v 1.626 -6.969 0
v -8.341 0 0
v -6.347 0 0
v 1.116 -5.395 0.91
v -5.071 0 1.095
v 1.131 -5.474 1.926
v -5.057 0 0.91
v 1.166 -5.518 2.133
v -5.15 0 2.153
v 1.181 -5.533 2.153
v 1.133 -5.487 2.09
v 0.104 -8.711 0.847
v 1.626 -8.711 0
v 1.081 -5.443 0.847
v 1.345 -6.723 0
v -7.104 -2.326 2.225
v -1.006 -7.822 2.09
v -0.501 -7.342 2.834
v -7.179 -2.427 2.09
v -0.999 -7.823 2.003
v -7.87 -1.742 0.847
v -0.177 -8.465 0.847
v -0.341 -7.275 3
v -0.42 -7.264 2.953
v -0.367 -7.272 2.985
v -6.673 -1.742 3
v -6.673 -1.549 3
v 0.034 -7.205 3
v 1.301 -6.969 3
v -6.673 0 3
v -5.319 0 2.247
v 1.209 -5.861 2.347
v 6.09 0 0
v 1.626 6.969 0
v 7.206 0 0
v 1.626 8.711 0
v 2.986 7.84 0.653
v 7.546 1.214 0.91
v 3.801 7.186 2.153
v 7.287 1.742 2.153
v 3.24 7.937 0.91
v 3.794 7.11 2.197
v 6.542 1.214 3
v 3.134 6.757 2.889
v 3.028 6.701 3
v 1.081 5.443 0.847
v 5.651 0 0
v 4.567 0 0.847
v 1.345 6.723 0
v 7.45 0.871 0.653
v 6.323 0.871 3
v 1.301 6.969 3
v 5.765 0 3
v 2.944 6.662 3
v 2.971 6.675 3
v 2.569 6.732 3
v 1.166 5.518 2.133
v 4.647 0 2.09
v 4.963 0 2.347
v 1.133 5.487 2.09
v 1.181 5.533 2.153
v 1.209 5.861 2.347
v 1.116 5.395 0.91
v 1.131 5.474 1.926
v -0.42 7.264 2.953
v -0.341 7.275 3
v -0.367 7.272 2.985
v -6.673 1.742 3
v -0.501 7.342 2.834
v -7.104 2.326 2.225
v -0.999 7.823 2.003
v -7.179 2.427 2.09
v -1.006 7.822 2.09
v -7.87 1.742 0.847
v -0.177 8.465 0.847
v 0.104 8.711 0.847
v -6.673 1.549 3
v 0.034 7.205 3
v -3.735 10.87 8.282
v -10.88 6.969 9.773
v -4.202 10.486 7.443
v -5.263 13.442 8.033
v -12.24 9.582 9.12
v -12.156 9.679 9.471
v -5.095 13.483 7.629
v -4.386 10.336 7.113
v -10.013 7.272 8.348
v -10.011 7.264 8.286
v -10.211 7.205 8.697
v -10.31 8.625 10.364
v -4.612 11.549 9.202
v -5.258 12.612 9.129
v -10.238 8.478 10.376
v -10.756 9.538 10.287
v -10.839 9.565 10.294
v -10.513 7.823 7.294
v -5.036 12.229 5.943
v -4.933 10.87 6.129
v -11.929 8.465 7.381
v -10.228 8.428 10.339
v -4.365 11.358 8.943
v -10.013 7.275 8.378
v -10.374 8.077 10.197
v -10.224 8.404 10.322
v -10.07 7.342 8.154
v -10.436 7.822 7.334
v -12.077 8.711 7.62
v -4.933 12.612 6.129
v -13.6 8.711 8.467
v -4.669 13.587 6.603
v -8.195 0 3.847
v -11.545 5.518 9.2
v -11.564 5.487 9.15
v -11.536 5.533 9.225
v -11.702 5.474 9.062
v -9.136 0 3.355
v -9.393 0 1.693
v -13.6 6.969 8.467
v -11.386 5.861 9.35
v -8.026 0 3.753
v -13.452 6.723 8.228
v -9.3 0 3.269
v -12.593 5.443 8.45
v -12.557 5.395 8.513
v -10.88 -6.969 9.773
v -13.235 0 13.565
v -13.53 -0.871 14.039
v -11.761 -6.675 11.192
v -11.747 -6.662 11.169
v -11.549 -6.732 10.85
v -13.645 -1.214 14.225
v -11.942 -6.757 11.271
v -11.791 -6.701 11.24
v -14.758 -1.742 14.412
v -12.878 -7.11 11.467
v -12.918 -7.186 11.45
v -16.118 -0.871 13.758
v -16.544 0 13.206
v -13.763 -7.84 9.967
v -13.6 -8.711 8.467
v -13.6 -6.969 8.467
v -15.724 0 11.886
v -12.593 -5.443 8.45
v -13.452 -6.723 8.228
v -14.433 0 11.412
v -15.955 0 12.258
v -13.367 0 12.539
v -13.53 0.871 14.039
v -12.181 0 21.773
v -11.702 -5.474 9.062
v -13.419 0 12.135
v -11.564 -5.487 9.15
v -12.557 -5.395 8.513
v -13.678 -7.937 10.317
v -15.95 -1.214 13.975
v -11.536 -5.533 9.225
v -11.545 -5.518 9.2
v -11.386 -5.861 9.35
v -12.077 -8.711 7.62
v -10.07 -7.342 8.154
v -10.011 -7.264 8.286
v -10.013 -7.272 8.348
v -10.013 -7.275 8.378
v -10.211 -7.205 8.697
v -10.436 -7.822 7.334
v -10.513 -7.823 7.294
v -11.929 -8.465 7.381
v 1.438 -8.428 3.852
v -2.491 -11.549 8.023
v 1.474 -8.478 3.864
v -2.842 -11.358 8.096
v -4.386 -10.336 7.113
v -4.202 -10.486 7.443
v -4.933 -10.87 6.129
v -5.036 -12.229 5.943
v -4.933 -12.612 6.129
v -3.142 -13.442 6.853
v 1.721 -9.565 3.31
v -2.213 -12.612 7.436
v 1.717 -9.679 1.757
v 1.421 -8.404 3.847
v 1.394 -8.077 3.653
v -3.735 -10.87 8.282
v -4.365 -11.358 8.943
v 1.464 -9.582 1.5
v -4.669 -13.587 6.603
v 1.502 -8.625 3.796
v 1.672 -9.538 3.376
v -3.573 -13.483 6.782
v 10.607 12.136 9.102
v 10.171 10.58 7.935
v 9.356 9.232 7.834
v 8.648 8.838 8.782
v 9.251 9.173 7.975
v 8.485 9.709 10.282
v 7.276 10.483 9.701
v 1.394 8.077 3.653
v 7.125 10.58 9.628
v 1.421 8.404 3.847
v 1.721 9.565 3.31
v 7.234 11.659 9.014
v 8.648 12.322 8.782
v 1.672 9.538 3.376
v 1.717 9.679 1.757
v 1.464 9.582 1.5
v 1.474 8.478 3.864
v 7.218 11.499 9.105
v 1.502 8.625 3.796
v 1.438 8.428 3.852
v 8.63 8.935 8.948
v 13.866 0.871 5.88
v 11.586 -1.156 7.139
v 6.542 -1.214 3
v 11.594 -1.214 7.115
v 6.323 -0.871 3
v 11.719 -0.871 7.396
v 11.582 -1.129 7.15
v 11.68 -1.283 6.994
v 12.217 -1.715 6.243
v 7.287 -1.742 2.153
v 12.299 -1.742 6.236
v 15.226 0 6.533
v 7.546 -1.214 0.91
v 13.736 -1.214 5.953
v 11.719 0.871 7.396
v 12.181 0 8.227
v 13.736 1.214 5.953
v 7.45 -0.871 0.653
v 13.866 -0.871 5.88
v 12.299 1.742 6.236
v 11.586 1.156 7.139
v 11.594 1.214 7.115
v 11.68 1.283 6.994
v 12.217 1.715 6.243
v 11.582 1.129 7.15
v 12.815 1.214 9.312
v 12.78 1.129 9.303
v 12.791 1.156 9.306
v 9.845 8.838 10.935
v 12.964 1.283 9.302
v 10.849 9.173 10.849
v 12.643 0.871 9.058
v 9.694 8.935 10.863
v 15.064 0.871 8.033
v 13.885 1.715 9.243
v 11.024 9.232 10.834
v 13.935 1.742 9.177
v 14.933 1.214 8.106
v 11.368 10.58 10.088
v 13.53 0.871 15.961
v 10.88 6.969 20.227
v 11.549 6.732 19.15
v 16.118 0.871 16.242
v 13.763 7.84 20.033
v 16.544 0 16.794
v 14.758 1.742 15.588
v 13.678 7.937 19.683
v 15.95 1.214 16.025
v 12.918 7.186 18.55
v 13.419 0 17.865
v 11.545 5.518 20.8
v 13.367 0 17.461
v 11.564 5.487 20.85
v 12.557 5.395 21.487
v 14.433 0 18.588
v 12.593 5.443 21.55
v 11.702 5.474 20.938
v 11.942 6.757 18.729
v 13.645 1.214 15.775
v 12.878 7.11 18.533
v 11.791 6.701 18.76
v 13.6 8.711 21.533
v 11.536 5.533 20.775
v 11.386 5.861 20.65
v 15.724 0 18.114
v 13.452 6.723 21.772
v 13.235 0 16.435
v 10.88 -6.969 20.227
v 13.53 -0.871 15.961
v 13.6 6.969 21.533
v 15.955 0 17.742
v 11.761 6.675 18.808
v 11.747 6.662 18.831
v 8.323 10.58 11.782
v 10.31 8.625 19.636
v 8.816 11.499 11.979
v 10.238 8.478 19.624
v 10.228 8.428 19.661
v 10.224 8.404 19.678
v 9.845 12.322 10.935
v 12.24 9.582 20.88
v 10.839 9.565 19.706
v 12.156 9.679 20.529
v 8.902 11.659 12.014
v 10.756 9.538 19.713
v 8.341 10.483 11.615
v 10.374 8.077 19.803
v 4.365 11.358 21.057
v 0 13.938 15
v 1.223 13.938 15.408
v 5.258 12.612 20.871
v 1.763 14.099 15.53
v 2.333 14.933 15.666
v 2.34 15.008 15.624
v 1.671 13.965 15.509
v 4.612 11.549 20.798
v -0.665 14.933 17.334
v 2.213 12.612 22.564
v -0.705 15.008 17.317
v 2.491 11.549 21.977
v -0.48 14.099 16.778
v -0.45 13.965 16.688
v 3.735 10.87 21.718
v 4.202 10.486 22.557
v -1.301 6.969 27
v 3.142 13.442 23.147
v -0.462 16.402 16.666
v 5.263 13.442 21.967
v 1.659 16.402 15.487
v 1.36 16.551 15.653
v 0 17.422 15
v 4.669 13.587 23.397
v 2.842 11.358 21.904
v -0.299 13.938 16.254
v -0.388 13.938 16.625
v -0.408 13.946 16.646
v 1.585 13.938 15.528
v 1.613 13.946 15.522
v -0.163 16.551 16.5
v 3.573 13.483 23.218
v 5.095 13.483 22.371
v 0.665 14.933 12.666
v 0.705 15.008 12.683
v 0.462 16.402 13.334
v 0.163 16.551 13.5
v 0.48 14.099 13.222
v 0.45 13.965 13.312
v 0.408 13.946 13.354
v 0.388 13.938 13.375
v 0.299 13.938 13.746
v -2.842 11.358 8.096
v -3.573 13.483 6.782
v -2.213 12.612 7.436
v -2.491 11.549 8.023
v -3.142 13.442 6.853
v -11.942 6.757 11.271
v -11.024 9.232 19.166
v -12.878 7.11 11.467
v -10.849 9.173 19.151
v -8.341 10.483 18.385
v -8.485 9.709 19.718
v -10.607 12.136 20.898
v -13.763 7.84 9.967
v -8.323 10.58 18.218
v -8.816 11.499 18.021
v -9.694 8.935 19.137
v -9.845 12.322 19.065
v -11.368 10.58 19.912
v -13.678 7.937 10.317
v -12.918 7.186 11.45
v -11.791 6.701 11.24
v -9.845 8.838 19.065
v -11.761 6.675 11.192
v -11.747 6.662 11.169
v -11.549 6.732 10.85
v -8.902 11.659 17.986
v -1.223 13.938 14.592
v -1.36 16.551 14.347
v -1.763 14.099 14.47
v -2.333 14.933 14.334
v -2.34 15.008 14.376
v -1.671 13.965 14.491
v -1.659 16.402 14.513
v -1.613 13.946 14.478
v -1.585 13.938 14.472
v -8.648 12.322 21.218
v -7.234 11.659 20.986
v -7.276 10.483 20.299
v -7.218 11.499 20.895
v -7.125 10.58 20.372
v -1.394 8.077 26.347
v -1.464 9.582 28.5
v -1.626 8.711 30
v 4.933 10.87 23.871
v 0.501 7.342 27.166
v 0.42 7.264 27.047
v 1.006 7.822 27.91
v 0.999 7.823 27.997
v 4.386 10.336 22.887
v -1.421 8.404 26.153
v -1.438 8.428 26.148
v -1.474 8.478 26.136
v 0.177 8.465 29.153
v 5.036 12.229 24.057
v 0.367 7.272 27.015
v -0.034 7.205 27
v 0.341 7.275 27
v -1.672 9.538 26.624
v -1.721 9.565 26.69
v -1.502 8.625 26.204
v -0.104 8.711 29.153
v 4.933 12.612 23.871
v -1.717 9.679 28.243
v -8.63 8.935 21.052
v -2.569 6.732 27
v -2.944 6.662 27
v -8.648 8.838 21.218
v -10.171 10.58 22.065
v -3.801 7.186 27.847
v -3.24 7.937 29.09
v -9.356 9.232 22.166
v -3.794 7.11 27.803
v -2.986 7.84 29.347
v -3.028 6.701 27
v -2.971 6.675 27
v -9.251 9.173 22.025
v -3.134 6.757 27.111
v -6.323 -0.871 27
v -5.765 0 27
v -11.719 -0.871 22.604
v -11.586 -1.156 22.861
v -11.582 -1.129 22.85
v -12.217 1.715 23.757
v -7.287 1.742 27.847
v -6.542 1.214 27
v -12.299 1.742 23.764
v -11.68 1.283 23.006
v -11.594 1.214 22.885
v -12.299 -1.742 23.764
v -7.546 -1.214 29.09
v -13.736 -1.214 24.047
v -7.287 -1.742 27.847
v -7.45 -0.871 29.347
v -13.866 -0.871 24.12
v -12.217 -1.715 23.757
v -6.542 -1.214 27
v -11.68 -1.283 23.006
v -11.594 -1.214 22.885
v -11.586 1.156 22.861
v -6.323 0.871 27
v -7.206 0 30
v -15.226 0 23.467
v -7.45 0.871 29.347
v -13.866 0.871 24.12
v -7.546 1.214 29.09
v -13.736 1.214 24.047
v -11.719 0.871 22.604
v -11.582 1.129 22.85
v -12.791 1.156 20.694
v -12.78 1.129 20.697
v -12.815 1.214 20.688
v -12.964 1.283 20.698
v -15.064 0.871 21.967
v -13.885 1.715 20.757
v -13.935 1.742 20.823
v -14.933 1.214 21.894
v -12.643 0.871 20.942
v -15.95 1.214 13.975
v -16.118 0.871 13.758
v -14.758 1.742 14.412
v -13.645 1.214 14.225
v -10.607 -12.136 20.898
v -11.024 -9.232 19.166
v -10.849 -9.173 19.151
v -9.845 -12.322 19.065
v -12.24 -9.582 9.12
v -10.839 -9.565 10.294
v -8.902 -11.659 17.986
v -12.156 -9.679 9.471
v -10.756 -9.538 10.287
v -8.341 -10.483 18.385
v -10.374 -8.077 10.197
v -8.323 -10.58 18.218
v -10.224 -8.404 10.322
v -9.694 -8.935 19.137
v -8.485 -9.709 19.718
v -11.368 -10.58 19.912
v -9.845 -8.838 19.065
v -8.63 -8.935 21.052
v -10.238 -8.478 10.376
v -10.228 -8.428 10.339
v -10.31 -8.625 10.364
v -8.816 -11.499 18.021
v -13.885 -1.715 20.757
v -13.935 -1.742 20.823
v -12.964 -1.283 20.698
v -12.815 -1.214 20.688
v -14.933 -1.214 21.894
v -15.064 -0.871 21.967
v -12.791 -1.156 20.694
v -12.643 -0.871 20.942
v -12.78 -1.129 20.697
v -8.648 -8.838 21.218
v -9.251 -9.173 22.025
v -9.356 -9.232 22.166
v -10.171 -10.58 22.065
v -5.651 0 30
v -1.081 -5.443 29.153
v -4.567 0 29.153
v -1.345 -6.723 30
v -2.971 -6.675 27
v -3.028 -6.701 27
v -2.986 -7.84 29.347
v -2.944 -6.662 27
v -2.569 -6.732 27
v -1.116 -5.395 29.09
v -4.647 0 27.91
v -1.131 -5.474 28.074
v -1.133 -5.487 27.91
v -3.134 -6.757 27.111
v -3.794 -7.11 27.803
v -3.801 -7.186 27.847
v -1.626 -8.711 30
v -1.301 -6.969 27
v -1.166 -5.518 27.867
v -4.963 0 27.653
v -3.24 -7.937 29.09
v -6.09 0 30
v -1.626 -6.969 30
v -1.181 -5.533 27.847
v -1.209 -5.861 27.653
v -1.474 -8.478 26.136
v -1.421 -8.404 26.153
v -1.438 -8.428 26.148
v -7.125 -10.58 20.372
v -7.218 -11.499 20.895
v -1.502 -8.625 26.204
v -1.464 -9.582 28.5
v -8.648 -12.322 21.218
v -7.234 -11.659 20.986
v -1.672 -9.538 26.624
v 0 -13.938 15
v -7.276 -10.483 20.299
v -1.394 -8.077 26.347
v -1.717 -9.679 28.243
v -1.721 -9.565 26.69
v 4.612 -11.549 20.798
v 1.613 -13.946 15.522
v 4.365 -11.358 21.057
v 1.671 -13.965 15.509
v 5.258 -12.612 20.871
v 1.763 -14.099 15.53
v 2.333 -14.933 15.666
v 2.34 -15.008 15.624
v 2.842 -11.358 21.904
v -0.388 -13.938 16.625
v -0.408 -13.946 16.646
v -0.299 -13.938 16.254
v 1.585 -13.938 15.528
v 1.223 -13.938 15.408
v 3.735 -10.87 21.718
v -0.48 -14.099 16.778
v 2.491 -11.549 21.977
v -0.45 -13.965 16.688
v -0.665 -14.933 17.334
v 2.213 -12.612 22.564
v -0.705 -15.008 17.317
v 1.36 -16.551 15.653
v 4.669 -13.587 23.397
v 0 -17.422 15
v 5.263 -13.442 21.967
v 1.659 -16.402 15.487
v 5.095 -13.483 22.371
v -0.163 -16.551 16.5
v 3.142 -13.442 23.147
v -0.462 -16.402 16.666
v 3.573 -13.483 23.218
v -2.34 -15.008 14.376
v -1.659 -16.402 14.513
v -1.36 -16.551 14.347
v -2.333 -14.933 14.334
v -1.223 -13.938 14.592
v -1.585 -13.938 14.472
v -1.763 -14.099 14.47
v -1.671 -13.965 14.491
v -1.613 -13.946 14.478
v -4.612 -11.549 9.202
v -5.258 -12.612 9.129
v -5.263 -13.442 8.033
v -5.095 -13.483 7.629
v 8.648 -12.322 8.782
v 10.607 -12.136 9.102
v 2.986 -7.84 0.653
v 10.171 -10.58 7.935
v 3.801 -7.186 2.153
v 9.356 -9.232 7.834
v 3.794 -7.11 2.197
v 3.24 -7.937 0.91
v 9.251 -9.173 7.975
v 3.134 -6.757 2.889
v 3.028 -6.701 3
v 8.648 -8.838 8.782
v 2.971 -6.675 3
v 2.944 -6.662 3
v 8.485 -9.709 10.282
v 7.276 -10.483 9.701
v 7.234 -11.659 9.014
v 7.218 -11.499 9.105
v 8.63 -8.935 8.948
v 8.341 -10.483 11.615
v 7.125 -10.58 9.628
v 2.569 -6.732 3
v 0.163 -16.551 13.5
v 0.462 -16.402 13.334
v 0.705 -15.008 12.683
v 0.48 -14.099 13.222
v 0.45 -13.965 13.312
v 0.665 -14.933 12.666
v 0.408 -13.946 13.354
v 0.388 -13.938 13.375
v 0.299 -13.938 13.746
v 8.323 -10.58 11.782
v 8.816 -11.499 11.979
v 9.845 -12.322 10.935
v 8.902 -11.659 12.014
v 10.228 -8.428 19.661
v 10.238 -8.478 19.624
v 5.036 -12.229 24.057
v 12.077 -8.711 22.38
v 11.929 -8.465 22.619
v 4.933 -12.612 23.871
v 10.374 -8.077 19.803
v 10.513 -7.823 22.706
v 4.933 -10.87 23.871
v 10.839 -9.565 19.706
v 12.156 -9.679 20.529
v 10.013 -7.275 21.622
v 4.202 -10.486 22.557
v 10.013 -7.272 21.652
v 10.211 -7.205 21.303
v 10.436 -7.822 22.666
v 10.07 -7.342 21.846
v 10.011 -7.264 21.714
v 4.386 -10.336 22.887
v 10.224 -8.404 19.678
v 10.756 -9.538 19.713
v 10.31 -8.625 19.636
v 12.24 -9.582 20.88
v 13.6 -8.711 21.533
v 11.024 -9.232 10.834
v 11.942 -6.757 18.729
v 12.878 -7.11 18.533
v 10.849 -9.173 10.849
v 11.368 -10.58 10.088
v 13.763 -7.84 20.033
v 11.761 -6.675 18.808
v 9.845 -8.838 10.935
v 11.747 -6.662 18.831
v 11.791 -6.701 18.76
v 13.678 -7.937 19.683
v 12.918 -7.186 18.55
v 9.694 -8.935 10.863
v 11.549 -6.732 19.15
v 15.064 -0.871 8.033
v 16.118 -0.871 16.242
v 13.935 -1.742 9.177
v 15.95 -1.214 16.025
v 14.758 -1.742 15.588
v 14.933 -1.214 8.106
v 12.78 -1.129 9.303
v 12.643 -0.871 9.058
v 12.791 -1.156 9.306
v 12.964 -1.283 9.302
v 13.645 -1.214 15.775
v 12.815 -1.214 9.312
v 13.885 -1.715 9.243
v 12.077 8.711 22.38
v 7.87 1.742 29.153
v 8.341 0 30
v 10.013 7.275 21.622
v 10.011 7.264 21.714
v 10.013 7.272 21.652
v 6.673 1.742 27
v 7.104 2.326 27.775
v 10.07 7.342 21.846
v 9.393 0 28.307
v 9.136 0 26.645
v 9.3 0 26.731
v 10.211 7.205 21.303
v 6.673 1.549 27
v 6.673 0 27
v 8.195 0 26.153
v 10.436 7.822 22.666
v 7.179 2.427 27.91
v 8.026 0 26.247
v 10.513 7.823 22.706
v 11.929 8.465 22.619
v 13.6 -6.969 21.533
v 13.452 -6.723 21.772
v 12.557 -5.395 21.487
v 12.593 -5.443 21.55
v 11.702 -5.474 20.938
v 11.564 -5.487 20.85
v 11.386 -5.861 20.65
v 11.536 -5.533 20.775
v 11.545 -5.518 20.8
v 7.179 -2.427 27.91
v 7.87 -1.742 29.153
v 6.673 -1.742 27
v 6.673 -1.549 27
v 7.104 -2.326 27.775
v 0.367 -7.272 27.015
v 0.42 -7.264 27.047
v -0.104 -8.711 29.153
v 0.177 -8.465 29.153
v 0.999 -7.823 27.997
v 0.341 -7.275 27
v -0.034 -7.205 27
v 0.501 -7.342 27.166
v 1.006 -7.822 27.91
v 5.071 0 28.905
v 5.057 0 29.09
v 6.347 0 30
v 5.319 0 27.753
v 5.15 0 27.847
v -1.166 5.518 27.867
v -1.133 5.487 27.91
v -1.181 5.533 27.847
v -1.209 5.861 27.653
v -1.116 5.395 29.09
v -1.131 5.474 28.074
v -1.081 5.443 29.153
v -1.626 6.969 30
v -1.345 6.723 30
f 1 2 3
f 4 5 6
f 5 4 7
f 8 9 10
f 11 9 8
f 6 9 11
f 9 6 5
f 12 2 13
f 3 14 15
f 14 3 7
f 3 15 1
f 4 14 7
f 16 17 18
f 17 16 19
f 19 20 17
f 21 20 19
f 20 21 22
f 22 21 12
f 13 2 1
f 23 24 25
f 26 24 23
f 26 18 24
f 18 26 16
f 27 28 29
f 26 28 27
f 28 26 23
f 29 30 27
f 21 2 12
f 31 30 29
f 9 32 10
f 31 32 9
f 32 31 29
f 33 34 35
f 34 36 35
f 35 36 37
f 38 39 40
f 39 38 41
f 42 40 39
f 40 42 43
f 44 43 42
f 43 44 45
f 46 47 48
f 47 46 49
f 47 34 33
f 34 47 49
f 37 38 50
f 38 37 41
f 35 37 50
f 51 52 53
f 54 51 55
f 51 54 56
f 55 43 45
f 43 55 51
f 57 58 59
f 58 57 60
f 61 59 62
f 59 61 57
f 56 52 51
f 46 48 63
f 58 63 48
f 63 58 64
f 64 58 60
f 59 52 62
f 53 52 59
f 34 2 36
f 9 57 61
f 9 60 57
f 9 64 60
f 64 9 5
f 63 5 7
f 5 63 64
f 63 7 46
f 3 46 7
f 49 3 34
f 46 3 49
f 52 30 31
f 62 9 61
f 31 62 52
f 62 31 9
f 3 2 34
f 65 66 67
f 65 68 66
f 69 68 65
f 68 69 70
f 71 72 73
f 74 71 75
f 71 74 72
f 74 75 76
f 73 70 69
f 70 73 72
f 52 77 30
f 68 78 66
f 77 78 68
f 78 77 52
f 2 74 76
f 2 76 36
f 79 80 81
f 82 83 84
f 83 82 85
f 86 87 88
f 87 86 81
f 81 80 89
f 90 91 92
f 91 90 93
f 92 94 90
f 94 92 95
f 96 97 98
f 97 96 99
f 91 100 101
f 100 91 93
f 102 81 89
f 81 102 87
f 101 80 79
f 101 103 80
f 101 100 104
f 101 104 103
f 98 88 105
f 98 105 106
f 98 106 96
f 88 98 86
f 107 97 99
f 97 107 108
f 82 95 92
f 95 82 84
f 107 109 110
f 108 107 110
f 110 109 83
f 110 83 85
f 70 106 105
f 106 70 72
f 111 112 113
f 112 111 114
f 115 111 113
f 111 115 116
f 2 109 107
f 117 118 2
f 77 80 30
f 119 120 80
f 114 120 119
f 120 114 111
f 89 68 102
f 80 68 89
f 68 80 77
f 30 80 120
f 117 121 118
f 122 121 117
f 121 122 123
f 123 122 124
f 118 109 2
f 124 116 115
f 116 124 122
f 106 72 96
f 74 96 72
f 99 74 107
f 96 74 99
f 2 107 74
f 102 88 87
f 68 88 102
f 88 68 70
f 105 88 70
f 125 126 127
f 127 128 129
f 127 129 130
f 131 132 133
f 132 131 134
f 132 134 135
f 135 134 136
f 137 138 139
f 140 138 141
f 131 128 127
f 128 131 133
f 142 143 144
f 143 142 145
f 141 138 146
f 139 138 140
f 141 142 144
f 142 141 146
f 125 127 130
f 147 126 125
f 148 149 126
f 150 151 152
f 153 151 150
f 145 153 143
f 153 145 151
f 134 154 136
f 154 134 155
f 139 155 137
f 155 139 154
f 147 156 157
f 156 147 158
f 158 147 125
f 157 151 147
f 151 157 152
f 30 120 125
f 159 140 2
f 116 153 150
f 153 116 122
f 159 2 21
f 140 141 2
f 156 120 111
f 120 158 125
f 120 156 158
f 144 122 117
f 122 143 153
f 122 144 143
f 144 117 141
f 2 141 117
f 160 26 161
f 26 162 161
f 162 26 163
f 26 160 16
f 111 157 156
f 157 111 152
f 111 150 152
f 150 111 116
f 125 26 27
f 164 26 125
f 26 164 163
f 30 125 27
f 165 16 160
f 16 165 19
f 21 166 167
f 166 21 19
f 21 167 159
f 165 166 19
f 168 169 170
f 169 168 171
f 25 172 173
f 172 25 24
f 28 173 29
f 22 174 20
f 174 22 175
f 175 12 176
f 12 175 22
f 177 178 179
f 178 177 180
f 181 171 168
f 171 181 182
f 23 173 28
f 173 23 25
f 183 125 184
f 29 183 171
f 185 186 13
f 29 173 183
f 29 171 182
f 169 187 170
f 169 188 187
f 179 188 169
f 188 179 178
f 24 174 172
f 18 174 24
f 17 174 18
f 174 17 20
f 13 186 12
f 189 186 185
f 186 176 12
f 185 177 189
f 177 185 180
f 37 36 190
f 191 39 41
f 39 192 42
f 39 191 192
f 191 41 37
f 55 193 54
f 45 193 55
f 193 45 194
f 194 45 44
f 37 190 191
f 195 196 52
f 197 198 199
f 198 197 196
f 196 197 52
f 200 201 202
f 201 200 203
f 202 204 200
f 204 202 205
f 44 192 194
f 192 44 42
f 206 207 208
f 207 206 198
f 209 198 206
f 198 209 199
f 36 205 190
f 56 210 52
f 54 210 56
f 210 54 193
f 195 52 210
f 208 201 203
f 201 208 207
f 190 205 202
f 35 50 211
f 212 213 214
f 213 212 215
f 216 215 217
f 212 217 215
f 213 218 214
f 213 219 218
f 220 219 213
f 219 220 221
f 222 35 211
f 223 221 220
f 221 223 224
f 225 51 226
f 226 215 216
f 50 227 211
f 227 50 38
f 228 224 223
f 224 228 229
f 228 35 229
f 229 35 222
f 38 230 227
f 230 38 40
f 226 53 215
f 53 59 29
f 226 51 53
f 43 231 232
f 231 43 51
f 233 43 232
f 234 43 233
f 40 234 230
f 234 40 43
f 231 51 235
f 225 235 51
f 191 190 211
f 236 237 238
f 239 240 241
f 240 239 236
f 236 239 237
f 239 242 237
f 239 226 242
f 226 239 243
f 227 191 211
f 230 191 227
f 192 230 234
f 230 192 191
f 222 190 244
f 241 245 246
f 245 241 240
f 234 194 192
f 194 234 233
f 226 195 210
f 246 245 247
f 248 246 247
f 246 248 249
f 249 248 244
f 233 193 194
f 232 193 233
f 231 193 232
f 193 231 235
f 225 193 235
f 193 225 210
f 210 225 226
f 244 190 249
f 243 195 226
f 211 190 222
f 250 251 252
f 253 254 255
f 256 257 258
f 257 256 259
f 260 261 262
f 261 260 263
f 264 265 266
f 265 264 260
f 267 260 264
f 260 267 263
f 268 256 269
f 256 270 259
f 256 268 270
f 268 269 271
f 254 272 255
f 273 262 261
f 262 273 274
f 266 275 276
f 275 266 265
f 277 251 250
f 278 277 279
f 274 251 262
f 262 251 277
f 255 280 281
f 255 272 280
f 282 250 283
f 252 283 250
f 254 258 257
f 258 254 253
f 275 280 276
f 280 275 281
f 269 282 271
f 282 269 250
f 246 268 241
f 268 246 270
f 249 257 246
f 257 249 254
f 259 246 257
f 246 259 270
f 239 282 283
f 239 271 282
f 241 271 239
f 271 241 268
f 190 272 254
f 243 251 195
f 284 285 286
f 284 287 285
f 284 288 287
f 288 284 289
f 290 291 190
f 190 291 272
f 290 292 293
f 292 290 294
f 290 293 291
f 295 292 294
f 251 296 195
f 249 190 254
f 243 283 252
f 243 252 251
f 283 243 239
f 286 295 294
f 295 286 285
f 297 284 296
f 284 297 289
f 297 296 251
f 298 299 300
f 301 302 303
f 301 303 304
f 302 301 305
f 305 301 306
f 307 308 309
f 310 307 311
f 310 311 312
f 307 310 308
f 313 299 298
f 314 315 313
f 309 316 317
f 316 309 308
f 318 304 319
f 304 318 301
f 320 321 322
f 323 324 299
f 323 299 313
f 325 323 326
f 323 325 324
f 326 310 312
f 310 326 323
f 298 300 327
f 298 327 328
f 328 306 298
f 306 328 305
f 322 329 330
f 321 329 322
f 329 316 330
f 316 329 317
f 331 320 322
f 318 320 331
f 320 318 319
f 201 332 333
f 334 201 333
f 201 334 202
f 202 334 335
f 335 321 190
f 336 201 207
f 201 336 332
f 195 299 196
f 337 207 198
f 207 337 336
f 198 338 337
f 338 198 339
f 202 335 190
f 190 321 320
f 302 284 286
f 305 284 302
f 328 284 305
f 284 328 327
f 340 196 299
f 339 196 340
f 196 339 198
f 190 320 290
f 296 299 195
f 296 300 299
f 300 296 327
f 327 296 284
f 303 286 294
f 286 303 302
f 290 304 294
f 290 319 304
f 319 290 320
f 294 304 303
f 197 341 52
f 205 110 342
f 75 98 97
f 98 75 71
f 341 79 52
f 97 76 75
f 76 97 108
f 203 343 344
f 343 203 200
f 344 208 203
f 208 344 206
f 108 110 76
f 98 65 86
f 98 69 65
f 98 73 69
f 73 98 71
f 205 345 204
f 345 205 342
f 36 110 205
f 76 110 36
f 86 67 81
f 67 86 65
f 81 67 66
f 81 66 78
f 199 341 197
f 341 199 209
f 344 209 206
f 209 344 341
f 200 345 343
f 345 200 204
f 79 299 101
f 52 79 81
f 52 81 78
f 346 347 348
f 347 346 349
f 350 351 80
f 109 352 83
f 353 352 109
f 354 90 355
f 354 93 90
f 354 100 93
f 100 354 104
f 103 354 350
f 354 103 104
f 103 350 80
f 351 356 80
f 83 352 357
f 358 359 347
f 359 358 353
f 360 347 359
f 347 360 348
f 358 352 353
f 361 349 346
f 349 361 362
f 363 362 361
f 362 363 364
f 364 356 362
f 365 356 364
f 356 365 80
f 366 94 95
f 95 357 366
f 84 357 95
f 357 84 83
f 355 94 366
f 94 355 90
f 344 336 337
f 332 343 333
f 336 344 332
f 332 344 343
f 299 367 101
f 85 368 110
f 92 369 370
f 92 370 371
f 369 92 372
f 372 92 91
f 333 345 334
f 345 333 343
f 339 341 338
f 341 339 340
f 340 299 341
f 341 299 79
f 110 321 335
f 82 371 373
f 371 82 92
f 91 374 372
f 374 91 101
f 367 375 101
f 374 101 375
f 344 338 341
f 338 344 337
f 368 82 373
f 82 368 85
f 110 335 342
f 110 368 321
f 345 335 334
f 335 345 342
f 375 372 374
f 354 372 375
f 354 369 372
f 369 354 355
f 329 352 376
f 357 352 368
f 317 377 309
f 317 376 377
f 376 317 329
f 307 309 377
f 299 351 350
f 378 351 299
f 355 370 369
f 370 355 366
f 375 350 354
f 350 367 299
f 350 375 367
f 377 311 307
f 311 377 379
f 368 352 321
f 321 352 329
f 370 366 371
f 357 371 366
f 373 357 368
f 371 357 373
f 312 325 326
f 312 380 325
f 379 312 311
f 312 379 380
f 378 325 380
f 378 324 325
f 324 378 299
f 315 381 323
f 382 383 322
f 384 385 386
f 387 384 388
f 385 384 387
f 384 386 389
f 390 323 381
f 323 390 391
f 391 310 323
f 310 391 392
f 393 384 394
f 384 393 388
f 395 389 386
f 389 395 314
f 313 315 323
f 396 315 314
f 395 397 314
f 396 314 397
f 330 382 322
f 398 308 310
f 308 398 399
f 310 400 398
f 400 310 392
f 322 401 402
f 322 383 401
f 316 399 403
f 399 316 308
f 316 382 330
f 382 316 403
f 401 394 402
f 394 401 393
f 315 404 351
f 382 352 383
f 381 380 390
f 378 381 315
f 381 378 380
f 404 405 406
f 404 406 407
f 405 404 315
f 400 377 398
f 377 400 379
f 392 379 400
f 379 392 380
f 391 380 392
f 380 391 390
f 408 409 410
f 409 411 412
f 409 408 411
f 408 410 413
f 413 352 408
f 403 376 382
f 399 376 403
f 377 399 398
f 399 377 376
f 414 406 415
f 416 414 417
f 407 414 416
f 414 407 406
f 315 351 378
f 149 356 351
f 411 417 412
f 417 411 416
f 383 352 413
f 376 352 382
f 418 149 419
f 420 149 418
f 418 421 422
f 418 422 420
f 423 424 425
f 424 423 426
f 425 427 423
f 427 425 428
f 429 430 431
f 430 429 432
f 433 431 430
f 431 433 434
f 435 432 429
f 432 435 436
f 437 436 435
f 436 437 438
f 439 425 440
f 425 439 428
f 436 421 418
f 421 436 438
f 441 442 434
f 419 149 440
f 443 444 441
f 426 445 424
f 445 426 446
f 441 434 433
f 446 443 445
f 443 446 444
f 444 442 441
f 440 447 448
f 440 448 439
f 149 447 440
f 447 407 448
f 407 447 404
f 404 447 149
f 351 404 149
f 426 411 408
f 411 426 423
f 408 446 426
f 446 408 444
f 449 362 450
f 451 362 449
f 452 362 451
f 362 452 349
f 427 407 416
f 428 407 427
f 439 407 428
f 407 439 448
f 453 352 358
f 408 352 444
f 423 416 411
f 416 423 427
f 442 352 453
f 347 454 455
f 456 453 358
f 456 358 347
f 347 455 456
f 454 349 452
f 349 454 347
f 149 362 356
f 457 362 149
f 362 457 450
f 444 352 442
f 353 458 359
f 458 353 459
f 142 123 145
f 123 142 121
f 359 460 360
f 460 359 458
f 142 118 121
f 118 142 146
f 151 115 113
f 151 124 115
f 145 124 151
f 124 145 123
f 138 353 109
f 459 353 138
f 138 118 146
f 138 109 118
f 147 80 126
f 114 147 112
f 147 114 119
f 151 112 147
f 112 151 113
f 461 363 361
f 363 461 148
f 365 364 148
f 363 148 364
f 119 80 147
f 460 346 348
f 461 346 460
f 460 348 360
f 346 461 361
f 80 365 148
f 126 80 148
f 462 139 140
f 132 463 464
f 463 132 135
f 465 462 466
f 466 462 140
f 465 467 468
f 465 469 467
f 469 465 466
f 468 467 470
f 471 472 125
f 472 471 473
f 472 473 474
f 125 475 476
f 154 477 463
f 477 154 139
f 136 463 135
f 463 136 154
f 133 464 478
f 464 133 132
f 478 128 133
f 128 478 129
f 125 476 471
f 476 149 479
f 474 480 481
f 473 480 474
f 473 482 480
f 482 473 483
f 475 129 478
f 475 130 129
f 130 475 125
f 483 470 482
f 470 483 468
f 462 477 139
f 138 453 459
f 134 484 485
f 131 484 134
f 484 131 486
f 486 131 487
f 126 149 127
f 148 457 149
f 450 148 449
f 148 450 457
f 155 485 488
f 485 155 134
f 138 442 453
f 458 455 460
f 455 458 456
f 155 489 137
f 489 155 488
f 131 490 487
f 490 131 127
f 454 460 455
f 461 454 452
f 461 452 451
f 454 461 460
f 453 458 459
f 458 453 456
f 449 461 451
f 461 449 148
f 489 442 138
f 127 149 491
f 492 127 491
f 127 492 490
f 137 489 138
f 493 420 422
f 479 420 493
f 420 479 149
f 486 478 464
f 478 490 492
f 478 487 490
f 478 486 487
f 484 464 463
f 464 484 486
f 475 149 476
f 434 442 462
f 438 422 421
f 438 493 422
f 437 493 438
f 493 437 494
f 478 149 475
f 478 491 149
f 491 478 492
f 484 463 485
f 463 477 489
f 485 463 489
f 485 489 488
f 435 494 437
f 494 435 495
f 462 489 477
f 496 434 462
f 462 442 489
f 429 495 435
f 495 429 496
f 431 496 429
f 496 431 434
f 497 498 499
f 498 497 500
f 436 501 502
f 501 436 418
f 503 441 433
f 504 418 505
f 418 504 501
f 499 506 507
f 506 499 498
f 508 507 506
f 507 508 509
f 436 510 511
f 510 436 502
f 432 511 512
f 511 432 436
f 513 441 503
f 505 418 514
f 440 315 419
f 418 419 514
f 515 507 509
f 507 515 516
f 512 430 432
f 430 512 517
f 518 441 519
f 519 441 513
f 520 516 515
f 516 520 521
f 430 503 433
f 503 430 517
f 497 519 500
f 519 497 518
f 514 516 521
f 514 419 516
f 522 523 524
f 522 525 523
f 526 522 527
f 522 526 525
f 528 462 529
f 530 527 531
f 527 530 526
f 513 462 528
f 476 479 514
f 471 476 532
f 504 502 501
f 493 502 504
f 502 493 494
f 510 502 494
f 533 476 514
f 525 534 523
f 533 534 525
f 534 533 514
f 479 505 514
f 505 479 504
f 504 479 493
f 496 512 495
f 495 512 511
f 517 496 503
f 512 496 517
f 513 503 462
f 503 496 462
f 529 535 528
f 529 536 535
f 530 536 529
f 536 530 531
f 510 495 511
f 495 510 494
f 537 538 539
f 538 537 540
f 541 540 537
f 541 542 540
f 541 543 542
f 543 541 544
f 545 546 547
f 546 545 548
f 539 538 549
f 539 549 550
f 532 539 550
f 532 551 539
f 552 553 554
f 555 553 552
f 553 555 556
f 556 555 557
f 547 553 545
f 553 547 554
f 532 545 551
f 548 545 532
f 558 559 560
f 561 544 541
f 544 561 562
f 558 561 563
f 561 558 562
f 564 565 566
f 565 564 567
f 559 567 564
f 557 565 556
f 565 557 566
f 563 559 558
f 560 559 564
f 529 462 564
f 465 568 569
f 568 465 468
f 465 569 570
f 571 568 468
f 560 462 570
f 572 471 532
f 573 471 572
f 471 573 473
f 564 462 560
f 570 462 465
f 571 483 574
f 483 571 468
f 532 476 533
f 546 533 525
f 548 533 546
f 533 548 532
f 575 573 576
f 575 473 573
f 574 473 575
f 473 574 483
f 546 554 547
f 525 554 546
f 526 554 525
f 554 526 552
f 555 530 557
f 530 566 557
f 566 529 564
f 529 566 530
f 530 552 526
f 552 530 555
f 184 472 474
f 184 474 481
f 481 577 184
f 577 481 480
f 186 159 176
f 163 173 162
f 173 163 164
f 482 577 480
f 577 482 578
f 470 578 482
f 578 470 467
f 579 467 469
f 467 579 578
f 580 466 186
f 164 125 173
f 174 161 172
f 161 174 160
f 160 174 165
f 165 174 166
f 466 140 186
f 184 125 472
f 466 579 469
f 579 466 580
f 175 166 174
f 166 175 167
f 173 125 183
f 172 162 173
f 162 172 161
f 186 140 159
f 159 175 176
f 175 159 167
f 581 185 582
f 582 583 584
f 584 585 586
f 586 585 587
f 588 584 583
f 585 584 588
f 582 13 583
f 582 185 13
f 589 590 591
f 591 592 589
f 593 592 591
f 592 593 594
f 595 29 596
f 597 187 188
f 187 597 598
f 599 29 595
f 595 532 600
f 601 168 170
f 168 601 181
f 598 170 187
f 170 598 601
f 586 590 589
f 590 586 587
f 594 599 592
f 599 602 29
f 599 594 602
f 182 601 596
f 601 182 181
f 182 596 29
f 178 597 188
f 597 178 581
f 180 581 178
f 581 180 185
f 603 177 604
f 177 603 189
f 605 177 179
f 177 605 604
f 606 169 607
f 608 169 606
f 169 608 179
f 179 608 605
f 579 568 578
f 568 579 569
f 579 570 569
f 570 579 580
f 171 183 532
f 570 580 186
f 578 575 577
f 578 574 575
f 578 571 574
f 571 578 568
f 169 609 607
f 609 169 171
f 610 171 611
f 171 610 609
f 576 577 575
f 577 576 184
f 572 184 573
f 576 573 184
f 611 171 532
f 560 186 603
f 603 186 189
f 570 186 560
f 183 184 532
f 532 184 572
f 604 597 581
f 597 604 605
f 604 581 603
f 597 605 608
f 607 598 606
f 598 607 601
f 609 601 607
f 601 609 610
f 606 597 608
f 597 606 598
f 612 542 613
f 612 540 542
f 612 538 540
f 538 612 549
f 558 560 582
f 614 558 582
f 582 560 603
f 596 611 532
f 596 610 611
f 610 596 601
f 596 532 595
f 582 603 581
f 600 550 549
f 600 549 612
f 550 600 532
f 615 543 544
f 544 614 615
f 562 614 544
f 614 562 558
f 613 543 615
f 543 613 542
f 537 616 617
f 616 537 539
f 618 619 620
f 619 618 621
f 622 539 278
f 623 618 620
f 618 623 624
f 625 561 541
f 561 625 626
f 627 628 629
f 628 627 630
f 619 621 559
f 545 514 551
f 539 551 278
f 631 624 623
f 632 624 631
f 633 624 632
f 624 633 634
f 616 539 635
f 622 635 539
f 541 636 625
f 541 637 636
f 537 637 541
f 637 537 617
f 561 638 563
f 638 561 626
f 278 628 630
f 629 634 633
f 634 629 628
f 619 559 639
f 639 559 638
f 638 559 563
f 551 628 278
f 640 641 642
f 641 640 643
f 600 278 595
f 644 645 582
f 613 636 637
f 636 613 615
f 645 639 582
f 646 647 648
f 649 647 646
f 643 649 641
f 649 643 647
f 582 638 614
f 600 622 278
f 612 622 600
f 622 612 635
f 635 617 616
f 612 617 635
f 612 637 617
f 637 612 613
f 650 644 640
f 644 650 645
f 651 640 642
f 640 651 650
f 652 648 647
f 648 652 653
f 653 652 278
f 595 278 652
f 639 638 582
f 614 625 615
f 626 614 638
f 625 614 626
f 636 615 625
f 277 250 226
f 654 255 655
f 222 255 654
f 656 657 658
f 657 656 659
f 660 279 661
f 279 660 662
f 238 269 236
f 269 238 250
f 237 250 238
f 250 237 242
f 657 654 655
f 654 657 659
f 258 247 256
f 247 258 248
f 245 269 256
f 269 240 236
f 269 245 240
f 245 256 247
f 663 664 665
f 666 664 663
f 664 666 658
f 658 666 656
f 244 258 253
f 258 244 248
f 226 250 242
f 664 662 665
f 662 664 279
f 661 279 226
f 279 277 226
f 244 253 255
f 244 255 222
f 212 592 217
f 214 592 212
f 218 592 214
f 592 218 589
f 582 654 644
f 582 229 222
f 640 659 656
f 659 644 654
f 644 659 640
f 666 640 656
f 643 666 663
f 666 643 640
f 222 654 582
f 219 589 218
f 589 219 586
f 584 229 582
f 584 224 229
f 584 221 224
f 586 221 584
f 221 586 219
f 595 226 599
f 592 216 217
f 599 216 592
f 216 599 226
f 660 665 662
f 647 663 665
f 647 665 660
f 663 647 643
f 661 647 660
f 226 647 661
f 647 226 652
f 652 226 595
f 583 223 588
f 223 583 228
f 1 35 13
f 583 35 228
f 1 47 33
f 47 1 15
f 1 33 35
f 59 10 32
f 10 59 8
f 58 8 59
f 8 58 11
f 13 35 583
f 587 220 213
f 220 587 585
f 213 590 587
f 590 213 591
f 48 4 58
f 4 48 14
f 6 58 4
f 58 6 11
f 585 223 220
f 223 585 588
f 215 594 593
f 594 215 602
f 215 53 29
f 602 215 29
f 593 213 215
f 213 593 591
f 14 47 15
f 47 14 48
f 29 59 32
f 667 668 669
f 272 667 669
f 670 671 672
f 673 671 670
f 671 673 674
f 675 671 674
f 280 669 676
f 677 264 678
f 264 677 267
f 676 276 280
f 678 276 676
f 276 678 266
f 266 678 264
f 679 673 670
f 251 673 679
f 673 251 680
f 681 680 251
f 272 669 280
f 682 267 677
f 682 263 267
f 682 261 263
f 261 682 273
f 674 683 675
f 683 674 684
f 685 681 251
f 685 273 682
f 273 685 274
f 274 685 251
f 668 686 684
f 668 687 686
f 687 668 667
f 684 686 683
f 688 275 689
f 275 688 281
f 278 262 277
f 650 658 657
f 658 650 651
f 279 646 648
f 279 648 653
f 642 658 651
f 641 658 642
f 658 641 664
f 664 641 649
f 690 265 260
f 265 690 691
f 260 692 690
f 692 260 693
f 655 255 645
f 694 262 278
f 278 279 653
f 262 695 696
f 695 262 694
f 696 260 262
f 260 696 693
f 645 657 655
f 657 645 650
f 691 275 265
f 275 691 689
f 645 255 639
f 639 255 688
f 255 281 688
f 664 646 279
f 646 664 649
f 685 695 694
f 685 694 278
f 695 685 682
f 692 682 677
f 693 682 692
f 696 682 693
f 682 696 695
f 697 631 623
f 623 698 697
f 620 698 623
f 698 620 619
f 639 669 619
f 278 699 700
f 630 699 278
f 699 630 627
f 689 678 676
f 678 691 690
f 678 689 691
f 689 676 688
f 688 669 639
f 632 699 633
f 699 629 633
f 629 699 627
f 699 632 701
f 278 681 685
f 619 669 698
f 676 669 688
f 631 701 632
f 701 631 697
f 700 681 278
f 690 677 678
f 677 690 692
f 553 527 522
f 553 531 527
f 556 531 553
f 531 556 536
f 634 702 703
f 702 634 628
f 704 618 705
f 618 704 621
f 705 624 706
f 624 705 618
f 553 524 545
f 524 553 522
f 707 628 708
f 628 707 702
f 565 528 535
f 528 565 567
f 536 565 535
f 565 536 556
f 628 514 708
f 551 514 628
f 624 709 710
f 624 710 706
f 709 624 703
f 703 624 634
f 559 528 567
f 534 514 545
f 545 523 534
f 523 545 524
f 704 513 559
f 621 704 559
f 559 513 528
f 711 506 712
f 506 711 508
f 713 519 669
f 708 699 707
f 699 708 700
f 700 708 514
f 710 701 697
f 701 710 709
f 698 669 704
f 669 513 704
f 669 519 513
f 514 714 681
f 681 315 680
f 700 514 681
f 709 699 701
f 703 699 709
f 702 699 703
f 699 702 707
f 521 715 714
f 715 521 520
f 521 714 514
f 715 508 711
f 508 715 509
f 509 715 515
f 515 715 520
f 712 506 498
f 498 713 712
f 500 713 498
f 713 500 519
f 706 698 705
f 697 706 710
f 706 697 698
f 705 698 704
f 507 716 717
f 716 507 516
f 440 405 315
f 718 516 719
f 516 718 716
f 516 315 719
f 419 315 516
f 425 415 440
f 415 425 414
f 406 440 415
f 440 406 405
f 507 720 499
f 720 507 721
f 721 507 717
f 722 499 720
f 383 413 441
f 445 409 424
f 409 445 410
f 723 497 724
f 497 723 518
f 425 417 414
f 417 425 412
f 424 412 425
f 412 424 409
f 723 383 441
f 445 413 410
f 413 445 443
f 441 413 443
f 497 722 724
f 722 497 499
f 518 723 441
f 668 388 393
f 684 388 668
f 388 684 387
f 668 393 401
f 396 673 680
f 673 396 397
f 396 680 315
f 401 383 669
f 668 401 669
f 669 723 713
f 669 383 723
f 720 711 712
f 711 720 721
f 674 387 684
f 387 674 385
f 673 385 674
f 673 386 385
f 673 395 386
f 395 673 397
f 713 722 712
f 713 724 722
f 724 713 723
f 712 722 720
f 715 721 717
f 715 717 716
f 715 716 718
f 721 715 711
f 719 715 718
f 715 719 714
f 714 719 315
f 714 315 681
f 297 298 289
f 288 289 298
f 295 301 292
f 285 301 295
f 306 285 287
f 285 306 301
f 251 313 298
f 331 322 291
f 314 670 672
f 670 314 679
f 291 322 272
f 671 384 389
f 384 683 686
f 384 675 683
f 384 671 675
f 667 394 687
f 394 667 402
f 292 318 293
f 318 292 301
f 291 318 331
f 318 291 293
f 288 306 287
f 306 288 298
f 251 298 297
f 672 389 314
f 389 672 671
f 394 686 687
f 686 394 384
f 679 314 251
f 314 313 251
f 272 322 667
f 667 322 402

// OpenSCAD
// shape height
sh = 30;
// border width
bw = 3;

include <polyhedra.scad>;

poly_wire(deltoidal_icositetrahedron);
